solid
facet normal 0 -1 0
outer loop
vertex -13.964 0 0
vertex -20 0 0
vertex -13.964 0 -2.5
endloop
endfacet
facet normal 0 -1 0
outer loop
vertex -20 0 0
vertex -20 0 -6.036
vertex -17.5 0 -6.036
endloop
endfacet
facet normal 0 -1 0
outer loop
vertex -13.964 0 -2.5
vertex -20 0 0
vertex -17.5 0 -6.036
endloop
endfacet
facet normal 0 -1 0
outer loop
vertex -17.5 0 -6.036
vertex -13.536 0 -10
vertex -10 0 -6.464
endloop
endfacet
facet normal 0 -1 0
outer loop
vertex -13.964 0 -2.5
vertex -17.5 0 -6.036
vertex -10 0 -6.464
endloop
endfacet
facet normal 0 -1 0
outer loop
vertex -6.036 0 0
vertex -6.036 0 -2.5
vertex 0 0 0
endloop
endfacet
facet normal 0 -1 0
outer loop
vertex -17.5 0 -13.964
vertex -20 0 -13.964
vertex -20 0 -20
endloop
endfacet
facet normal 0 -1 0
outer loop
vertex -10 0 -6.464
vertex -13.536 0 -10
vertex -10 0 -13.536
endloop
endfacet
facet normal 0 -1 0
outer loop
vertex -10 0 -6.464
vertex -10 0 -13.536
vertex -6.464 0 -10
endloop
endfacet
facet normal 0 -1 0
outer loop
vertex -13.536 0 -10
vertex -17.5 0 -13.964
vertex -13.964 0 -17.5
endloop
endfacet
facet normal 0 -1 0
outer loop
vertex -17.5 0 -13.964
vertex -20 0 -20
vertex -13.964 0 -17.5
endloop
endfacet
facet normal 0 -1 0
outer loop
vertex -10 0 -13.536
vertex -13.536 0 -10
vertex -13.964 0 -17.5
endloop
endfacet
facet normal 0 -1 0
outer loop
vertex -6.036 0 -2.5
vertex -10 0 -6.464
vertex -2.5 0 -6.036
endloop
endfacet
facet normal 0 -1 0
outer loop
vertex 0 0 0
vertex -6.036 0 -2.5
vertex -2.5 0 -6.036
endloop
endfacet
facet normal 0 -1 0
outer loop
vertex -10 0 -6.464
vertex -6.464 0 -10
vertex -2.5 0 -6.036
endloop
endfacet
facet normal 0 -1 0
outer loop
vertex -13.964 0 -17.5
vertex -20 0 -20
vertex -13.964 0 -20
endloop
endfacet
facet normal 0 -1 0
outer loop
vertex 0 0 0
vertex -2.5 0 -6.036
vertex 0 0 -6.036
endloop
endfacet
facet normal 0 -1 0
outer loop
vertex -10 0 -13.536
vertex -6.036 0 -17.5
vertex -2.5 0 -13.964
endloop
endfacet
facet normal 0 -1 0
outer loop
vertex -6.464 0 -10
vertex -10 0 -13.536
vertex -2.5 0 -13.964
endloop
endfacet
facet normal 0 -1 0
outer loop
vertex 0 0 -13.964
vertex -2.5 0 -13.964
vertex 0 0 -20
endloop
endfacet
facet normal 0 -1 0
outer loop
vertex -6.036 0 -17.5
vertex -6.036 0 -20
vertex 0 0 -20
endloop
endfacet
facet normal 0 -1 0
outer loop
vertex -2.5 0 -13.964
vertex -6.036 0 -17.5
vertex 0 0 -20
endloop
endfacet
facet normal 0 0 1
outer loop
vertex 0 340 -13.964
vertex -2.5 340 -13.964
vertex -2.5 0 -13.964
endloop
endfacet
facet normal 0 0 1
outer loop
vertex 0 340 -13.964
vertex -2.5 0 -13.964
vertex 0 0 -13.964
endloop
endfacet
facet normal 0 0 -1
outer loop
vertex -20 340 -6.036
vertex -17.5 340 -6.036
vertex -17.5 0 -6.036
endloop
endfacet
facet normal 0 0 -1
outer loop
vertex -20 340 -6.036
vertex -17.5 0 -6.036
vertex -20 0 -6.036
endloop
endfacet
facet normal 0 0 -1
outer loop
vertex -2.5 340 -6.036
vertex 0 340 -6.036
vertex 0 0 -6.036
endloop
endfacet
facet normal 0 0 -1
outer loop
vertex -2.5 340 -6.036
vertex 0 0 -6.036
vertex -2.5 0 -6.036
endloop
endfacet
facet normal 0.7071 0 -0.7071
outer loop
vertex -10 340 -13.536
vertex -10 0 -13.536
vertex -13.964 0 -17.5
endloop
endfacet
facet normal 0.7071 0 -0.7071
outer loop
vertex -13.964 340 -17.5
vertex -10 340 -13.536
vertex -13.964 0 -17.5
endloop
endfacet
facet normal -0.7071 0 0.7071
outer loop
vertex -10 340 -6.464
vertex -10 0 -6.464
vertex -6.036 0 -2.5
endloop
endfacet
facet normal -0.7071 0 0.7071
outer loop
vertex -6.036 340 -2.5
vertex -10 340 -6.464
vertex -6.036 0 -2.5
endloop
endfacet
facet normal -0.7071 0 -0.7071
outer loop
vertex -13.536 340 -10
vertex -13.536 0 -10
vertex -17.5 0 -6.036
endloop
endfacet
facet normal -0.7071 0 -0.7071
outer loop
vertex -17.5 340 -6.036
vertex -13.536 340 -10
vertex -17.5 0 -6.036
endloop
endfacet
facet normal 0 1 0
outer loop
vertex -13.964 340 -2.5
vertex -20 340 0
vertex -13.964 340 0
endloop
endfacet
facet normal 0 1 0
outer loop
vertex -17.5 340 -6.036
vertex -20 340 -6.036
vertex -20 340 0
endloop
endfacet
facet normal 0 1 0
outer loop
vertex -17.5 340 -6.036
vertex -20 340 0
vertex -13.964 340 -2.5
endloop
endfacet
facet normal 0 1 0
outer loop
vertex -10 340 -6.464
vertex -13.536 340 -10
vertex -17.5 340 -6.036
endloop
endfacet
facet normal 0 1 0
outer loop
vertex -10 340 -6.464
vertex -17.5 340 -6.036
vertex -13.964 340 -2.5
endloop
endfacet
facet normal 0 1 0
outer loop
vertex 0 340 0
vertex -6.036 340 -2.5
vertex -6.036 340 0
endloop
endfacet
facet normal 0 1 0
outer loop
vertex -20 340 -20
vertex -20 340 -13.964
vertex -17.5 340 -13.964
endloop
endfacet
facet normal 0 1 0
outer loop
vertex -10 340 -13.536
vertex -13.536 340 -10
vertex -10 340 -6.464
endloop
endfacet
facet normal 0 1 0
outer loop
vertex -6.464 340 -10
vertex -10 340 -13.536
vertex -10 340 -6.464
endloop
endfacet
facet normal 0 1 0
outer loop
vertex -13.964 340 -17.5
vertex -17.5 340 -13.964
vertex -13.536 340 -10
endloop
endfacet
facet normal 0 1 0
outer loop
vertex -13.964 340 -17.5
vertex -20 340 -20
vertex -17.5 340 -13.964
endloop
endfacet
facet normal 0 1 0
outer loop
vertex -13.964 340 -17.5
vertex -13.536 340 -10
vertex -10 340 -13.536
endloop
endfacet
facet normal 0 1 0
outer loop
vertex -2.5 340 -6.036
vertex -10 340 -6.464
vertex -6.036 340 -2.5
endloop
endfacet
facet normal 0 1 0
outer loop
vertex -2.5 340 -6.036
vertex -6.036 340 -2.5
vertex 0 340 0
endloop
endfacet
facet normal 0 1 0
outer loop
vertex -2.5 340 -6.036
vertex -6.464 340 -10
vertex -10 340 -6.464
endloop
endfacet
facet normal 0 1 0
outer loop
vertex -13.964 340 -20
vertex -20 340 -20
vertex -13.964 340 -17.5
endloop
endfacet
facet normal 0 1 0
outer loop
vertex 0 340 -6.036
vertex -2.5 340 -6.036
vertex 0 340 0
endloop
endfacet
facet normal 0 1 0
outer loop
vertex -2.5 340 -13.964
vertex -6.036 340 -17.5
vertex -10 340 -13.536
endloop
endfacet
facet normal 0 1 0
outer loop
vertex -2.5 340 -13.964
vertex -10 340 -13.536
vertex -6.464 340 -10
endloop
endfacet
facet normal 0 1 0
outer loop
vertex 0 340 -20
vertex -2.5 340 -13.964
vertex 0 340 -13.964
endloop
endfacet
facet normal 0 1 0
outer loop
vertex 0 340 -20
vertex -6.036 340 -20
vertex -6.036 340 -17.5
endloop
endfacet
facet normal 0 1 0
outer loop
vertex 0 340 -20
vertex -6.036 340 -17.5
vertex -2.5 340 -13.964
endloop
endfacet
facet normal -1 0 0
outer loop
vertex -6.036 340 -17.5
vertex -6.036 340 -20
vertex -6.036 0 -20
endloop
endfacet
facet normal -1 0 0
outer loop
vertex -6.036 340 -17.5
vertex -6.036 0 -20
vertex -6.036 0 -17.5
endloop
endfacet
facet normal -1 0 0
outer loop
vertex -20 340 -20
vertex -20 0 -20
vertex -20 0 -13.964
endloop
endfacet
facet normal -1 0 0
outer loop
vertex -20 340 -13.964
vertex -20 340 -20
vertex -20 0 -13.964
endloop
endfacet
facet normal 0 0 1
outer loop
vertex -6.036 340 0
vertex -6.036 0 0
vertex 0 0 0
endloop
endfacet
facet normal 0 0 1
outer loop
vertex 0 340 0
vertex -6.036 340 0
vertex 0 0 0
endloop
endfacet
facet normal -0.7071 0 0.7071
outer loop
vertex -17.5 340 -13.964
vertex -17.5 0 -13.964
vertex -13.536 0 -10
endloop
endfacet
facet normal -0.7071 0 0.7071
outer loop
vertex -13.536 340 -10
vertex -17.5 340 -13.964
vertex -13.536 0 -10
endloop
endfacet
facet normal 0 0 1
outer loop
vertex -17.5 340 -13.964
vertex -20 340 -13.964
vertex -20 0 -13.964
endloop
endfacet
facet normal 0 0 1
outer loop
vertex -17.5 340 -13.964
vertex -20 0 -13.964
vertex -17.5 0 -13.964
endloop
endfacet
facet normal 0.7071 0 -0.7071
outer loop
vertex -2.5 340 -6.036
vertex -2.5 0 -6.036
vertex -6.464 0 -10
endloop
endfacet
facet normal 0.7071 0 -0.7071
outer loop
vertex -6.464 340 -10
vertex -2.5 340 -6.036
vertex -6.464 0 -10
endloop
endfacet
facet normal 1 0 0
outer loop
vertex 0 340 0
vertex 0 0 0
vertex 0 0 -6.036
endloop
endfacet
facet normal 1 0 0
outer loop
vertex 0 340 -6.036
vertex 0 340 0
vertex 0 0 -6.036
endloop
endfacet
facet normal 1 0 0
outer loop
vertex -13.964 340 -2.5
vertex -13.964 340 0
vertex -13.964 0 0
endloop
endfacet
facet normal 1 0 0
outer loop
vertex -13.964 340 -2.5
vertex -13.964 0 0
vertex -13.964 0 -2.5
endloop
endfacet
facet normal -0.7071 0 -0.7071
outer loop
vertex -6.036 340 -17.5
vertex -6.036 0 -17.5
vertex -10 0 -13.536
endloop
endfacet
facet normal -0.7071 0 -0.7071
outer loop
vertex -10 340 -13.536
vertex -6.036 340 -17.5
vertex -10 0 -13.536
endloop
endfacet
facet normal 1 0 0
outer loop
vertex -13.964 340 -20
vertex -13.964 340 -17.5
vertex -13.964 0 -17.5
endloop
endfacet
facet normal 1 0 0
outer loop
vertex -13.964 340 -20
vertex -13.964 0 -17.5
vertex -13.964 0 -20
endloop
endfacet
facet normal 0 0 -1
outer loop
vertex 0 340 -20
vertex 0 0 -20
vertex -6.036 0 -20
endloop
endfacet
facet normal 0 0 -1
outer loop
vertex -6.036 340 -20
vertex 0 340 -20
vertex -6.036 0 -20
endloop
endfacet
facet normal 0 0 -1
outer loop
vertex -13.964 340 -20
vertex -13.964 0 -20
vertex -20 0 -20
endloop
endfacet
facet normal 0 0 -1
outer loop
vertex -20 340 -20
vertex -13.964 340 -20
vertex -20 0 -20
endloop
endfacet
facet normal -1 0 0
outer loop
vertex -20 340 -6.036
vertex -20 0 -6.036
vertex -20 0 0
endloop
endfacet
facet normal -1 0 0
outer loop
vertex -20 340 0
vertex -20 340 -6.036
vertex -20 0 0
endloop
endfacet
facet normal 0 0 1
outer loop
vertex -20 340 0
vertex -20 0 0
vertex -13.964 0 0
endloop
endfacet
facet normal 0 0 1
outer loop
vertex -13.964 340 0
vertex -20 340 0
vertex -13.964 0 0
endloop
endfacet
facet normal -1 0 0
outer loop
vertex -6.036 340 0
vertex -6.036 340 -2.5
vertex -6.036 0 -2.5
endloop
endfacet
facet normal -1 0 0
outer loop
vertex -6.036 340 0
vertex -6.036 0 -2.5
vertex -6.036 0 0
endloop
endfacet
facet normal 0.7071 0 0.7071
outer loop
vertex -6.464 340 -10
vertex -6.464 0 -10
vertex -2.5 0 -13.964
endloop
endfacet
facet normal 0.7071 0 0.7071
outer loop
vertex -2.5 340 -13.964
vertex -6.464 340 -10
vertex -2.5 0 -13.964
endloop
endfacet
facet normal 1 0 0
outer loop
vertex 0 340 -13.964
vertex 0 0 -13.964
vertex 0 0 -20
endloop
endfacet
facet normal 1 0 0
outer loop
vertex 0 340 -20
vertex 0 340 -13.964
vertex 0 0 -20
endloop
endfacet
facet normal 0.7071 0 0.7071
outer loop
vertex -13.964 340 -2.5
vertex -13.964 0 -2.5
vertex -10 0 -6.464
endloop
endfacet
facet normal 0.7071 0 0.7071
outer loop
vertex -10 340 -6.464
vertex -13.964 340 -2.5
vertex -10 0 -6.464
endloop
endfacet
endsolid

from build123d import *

# Parameters (mm, degrees)
BOSS_EXTRU_1_DEPTH = 340


with BuildPart() as part:
    # Esquisse1 → Boss.-Extru.1 (new body)
    with BuildSketch(Plane(origin=(0, 0, 0), x_dir=(1, 0, 0), z_dir=(0, 1, 0))):
        Polygon((-3.535533906, 0), (-6.035533906, 2.5), (-6.035533906, 0), align=None)
        Polygon((0, 3.535533906), (-2.5, 6.035533906), (-2.5, 2.5), (-6.035533906, 2.5), (-3.535533906, 0), (0, 0), align=None)
        Polygon((0, 6.035533906), (-2.5, 6.035533906), (0, 3.535533906), align=None)
        Polygon((-2.5, 2.5), (-2.5, 6.035533906), (-6.464466094, 10), (-10, 6.464466094), (-6.035533906, 2.5), align=None)
        Polygon((-13.964466094, 0), (-13.964466094, 2.5), (-16.464466094, 0), align=None)
        Polygon((-17.5, 2.5), (-17.5, 6.035533906), (-20, 3.535533906), (-20, 0), (-16.464466094, 0), (-13.964466094, 2.5), align=None)
        Polygon((-20, 3.535533906), (-17.5, 6.035533906), (-20, 6.035533906), align=None)
        Polygon((-10, 6.464466094), (-13.535533906, 10), (-17.5, 6.035533906), (-17.5, 2.5), (-13.964466094, 2.5), align=None)
        Polygon((-6.464466094, 10), (-10, 13.535533906), (-13.535533906, 10), (-10, 6.464466094), align=None)
        Polygon((-2.5, 13.964466094), (-2.5, 17.5), (-6.035533906, 17.5), (-10, 13.535533906), (-6.464466094, 10), align=None)
        Polygon((-6.035533906, 17.5), (-2.5, 17.5), (-2.5, 13.964466094), (0, 16.464466094), (0, 20), (-3.535533906, 20), align=None)
        Polygon((0, 16.464466094), (-2.5, 13.964466094), (0, 13.964466094), align=None)
        Polygon((-6.035533906, 20), (-6.035533906, 17.5), (-3.535533906, 20), align=None)
        Polygon((-16.464466094, 20), (-13.964466094, 17.5), (-13.964466094, 20), align=None)
        Polygon((-17.5, 17.5), (-13.964466094, 17.5), (-16.464466094, 20), (-20, 20), (-20, 16.464466094), (-17.5, 13.964466094), align=None)
        Polygon((-20, 13.964466094), (-17.5, 13.964466094), (-20, 16.464466094), align=None)
        Polygon((-10, 13.535533906), (-13.964466094, 17.5), (-17.5, 17.5), (-17.5, 13.964466094), (-13.535533906, 10), align=None)
    extrude(amount=BOSS_EXTRU_1_DEPTH)


solid = part.part
